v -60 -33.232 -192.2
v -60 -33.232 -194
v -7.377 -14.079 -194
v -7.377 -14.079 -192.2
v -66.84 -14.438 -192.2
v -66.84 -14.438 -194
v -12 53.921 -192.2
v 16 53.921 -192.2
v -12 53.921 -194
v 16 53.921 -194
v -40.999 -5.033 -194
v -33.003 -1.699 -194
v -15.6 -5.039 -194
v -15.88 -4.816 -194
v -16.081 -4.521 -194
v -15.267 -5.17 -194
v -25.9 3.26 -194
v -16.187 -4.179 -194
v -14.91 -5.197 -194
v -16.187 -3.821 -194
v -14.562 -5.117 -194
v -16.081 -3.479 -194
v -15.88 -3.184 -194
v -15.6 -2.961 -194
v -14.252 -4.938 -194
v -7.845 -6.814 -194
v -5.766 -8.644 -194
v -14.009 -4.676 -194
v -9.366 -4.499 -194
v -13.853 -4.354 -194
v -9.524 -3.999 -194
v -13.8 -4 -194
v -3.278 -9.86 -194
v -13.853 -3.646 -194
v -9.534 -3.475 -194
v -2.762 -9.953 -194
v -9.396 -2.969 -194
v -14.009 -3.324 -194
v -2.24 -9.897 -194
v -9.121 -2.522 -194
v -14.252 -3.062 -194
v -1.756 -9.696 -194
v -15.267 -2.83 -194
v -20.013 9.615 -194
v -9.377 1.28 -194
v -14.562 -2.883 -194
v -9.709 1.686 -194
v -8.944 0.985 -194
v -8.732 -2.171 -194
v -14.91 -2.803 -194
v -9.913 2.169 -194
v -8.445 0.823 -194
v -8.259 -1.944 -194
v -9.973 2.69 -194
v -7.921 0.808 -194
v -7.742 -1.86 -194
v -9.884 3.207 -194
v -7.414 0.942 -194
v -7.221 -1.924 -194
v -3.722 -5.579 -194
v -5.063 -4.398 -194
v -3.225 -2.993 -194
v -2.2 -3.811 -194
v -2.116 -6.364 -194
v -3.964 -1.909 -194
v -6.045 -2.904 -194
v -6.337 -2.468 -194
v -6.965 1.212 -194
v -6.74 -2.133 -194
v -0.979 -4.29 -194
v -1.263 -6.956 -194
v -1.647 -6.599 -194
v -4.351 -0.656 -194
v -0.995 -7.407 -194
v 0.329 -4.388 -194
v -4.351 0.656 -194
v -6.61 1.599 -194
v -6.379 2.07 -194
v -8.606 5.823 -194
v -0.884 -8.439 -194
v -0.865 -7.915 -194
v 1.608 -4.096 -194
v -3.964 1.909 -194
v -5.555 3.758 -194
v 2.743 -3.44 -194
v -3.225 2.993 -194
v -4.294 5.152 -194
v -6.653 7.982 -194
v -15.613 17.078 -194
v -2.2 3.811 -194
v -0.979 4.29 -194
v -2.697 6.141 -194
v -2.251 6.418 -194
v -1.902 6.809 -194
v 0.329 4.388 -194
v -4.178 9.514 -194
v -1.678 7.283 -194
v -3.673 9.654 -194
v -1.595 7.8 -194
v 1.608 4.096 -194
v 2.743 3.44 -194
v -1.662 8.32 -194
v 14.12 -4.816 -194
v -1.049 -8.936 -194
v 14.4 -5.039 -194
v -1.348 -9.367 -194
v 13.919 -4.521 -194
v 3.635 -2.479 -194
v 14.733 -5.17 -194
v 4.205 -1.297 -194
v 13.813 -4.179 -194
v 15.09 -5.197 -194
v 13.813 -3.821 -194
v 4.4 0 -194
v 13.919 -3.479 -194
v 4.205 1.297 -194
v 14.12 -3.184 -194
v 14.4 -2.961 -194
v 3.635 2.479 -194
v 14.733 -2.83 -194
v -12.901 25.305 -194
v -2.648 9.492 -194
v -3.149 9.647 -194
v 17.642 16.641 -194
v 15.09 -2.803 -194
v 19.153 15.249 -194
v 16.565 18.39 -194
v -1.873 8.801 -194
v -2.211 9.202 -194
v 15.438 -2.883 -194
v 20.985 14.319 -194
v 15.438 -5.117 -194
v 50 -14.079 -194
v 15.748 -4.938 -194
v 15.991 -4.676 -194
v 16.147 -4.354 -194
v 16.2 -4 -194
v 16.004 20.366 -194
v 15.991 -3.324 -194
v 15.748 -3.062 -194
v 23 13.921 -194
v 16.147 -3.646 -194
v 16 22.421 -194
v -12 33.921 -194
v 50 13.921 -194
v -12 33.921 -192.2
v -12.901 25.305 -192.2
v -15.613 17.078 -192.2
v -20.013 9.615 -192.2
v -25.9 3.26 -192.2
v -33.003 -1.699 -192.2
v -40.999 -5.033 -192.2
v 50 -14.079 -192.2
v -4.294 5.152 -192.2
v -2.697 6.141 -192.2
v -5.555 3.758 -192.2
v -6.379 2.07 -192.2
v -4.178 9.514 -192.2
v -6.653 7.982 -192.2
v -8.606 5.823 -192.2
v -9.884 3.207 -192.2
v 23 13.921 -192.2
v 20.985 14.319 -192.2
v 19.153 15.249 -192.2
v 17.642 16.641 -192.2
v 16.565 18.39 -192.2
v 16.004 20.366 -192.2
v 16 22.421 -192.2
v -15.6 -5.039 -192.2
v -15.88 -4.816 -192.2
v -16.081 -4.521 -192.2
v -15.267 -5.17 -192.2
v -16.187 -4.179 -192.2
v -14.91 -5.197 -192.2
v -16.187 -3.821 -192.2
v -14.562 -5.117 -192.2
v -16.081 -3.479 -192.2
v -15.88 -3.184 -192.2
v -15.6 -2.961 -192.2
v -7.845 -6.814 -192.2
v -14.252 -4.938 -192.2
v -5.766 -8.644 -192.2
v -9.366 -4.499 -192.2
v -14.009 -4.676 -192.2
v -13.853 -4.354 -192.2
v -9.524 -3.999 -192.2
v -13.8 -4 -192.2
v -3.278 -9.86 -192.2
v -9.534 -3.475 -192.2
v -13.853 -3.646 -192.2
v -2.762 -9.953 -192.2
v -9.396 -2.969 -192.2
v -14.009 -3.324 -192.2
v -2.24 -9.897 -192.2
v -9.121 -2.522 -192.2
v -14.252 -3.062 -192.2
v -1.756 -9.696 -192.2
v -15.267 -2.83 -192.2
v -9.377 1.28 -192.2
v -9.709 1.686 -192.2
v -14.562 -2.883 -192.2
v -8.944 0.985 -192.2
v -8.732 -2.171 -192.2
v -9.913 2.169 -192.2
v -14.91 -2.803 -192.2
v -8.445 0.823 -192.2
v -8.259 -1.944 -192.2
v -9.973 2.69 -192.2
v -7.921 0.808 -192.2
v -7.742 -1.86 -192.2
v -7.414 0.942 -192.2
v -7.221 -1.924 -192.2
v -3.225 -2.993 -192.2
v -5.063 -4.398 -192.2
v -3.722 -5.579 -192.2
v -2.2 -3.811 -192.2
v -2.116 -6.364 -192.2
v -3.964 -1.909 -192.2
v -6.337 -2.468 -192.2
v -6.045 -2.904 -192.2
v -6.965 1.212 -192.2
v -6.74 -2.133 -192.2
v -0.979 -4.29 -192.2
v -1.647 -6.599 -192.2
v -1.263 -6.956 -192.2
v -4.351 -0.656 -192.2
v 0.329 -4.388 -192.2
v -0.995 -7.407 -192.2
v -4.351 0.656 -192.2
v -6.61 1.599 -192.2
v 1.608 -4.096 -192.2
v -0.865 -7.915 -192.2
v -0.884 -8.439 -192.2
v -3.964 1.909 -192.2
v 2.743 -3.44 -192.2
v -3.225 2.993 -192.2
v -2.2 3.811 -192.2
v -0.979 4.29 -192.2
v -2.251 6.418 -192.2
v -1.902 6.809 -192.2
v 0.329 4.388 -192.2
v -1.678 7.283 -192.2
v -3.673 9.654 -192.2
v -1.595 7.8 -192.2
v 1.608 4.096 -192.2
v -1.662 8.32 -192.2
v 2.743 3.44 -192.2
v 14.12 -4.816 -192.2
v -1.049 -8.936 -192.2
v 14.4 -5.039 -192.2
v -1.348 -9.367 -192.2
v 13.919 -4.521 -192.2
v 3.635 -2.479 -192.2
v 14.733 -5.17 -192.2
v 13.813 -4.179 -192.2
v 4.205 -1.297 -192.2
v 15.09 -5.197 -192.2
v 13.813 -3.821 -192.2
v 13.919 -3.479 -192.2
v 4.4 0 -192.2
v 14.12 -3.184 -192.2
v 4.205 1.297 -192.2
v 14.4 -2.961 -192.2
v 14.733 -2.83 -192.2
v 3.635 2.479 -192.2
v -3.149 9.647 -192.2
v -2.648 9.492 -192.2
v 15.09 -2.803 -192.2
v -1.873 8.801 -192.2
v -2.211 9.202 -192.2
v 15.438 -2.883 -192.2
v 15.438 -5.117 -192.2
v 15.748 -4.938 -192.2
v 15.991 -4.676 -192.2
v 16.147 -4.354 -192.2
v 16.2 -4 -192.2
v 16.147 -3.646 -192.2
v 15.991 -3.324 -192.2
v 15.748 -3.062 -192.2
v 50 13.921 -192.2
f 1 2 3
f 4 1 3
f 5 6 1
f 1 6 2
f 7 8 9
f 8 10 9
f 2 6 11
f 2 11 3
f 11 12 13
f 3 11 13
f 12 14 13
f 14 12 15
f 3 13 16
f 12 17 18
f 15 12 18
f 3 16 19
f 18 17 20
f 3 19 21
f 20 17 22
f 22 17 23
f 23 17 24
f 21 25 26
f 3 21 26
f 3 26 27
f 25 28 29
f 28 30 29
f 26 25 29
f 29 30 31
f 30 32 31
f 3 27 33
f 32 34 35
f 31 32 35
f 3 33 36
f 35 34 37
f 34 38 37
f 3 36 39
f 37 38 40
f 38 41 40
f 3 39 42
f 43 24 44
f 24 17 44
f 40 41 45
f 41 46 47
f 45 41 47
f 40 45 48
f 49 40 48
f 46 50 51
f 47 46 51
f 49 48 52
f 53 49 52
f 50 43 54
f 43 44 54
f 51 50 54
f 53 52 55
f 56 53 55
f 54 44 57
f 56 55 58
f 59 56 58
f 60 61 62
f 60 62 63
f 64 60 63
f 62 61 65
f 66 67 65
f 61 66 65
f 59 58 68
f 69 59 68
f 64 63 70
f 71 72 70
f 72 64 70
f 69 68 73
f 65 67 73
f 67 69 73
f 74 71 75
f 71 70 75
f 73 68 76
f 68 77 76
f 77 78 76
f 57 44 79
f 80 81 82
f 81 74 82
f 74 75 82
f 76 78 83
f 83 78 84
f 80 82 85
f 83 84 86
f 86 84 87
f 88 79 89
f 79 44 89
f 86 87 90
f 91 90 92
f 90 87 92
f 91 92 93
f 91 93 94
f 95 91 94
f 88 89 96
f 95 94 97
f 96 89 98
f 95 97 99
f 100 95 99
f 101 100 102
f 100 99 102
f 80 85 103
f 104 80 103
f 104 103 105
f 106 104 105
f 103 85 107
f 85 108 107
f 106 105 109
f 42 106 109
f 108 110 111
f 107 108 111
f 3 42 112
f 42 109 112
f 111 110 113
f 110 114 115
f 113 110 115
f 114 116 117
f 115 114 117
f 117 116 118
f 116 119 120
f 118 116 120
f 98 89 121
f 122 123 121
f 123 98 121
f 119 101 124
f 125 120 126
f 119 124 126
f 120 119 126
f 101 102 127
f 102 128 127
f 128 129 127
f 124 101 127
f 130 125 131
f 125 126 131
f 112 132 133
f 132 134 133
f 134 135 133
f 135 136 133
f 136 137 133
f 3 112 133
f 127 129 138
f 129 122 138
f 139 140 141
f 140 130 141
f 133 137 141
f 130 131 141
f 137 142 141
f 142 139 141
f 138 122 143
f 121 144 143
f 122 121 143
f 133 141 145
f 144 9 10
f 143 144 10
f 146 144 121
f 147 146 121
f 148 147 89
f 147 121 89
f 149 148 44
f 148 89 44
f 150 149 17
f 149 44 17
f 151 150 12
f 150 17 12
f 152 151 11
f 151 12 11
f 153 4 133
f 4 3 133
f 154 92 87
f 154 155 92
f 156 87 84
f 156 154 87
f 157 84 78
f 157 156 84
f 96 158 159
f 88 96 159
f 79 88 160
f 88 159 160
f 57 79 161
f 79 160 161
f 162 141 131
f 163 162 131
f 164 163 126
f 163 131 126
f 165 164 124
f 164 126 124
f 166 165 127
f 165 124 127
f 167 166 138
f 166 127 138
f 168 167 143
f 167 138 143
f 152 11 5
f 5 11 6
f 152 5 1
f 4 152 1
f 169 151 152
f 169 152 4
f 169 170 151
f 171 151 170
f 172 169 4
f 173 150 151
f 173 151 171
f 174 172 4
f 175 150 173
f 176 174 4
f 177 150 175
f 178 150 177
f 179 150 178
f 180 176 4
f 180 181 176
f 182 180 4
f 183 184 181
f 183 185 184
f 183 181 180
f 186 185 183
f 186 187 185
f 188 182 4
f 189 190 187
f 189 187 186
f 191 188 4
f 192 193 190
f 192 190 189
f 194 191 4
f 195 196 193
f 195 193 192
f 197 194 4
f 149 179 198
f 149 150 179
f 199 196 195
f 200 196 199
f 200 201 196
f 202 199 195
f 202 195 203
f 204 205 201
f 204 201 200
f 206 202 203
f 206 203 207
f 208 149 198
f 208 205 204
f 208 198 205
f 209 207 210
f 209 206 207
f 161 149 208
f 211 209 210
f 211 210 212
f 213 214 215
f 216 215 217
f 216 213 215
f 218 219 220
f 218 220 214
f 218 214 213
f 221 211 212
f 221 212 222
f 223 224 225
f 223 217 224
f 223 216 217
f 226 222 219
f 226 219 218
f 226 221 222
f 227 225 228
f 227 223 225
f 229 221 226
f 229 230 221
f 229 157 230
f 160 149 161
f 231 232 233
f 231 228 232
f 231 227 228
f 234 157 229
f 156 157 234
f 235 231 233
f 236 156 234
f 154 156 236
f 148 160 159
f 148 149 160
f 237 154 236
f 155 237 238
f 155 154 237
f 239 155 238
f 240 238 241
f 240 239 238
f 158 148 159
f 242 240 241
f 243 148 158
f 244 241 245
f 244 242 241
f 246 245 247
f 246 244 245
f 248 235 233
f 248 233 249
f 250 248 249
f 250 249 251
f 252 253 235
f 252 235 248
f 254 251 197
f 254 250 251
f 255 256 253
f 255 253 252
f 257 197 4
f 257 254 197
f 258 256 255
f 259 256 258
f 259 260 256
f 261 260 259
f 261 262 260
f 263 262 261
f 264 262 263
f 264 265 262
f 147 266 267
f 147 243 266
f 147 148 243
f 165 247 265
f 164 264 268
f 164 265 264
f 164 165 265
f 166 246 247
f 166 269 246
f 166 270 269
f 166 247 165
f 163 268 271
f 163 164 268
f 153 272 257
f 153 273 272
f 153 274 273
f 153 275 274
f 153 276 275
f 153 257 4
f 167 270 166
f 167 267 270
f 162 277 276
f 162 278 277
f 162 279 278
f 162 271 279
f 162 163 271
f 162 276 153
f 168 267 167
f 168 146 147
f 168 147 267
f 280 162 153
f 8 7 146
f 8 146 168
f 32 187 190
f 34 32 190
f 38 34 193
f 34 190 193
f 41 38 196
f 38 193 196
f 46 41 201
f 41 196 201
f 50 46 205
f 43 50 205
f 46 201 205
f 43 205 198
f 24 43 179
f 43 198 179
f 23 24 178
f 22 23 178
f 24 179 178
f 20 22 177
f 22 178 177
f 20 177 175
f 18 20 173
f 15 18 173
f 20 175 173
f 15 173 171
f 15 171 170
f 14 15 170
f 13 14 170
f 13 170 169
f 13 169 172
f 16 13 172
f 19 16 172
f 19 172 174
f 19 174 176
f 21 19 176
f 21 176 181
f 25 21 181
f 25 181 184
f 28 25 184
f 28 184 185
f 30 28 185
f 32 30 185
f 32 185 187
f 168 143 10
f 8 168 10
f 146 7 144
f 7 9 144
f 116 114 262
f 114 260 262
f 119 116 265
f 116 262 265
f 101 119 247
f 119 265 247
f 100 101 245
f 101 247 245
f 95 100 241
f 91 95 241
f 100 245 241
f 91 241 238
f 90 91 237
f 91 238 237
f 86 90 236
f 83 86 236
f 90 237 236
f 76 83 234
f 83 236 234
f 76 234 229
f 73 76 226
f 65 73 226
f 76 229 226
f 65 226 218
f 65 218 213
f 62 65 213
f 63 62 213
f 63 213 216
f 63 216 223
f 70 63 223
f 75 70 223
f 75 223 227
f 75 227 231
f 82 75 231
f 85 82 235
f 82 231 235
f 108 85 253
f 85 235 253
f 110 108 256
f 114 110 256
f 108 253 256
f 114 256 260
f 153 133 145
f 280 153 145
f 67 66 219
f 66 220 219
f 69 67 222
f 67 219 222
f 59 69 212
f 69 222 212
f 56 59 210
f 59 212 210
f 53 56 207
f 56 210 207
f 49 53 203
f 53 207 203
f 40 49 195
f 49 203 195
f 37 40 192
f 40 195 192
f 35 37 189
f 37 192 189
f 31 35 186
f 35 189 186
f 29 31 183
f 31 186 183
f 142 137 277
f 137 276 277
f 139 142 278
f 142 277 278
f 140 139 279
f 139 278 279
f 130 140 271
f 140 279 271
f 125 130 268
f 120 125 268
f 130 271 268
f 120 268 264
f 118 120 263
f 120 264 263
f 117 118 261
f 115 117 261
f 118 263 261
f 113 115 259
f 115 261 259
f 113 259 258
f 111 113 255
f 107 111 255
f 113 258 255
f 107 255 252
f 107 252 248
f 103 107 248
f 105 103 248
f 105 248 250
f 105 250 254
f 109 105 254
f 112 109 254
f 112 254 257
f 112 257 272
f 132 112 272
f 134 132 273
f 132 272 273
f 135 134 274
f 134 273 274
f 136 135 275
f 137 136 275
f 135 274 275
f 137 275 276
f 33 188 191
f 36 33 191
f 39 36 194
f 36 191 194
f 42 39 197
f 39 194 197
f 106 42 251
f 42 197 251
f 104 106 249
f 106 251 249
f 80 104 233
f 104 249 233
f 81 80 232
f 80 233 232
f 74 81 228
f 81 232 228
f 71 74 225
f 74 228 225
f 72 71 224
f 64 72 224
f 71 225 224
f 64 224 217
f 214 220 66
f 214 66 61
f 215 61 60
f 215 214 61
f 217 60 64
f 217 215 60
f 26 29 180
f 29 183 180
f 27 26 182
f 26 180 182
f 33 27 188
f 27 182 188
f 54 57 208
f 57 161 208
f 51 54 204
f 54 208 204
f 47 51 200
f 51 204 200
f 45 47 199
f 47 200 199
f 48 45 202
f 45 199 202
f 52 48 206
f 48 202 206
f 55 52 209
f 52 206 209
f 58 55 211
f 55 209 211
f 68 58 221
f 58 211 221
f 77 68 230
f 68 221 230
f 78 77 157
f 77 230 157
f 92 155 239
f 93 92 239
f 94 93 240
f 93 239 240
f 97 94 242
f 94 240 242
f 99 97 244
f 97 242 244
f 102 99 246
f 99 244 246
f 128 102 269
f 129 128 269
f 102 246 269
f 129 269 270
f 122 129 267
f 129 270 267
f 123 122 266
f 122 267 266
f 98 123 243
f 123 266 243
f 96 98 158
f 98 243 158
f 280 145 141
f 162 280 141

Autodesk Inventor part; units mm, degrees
ref_plane "YZ Plane" through (0, 0, 0) normal (1, 0, 0) x (0, 1, 0)
ref_plane "XZ Plane" through (0, 0, 0) normal (0, 1, 0) x (-1, 0, 0)
ref_plane "XY Plane" through (0, 0, 0) normal (0, 0, 1) x (1, 0, 0)
ref_plane "РабПлоскость5" through (0, 0, -194) normal (0, 0, 1) x (1, 0, 0)
sketch "Эскиз4" plane through (0, 0, -194) normal (0, 0, 1) x (1, 0, 0)
  line L0 (-7.3772, -14.0792) -> (50, -14.0792)
  line L1 (-60, -33.2323) -> (-7.3772, -14.0792)
  line L2 (-66.8404, -14.4385) -> (-60, -33.2323)
  line L3 (-40.9989, -5.0329) -> (-66.8404, -14.4385)
  arc A0 (-40.9989, -5.0329) -> (-12, 33.9208) centre (-52.4998, 33.7998) ccw
  line L4 (-12, 53.9208) -> (-12, 33.9208)
  line L5 (16, 53.9208) -> (-12, 53.9208)
  line L6 (16, 22.4208) -> (16, 53.9208)
  arc A1 (16, 22.4208) -> (23, 13.9208) centre (23.4314, 21.4084) ccw
  line L7 (50, 13.9208) -> (23, 13.9208)
  line L8 (50, -14.0792) -> (50, 13.9208)
  point P0 (0, 0)
extrude "Выдавливание4" add sketch "Эскиз4" along normal blind 1.8
sketch "Эскиз5" plane through (0, 0, -192.2) normal (0, 0, 1) x (1, 0, 0)
  circle A0 centre (0, 0) radius 4.4
  circle A1 centre (0, 0) radius 12
  circle A2 centre (15, -4) radius 1.2
  line L0 (0, 0) -> (0, -30) construction
  circle A3 centre (-15, -4) radius 1.2
  arc A4 (-3.4374, 7.8273) -> (-8.1316, 2.6381) centre (0, 0) ccw construction
  arc A5 (-4.1781, 9.5141) -> (-9.8839, 3.2066) centre (0, 0) ccw
  arc A6 (-2.6966, 6.1406) -> (-6.3793, 2.0696) centre (0, 0) ccw
  arc A7 (-2.6966, 6.1406) -> (-4.1781, 9.5141) centre (-3.4374, 7.8273) ccw
  arc A8 (-9.8839, 3.2066) -> (-6.3793, 2.0696) centre (-8.1316, 2.6381) ccw
  arc A9 (-7.7059, -3.7016) -> (-2.6966, -8.1124) centre (0, 0) ccw construction
  arc A10 (-9.3665, -4.4992) -> (-3.2777, -9.8605) centre (0, 0) ccw
  arc A11 (-6.0453, -2.9039) -> (-2.1155, -6.3642) centre (0, 0) ccw
  arc A12 (-6.0453, -2.9039) -> (-9.3665, -4.4992) centre (-7.7059, -3.7016) ccw
  arc A13 (-3.2777, -9.8605) -> (-2.1155, -6.3642) centre (-2.6966, -8.1124) ccw
  dimension "d42" = 8.8
  dimension "d43" = 24
  dimension "d44" = 2.4
  dimension "d46" = 30
  dimension "d47" = 15
  dimension "d48" = 4
extrude "Выдавливание5" cut sketch "Эскиз5" against normal blind 30 contours A0 | A2 | A3 | A7 A6 A8 A5 | A12 A11 A13 A10
equation "\"d49\" = d46"
properties part number "Обхват головы"
